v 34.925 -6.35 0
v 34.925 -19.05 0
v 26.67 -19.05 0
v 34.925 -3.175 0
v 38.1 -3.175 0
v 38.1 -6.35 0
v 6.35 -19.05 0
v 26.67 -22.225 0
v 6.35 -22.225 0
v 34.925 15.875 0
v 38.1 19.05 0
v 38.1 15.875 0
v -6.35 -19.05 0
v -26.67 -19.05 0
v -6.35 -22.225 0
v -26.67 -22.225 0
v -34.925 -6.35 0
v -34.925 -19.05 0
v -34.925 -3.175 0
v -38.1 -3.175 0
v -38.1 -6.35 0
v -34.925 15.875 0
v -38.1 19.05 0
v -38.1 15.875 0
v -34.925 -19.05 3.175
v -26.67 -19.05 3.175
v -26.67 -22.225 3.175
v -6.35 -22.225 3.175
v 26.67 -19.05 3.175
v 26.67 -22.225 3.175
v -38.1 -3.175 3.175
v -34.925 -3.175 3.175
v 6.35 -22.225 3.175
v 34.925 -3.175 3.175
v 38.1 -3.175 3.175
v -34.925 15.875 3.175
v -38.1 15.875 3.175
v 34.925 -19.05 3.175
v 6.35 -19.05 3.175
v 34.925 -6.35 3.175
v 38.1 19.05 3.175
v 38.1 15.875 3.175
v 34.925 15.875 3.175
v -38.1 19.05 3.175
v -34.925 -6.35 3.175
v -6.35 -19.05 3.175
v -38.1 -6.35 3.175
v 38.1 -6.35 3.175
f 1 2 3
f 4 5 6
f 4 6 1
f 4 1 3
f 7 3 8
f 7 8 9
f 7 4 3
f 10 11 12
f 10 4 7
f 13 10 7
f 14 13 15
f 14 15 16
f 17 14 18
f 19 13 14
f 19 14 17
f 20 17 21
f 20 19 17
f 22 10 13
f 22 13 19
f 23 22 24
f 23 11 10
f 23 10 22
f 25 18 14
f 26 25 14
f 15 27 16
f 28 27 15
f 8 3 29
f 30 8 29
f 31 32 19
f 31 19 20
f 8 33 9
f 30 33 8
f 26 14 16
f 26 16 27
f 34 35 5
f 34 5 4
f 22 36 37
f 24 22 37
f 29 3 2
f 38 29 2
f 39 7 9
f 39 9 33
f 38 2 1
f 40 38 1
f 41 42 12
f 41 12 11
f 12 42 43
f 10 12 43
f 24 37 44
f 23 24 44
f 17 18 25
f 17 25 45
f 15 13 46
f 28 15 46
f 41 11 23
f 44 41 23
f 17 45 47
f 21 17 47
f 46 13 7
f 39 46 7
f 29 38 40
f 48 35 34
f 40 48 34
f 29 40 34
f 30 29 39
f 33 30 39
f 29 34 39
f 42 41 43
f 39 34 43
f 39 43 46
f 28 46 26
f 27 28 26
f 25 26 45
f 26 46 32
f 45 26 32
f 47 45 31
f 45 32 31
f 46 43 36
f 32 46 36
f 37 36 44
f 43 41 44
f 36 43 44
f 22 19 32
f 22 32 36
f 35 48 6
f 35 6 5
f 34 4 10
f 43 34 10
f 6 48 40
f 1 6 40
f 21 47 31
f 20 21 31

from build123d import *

# Parameters (mm, degrees)
SKETCH1_W           = 69.85
SKETCH1_H           = 38.1
BOSS_EXTRUDE1_DEPTH = 3.175
SKETCH2_W           = 3.175
SKETCH2_H           = 3.175
BOSS_EXTRUDE2_DEPTH = 3.175
SKETCH3_W           = 20.32
SKETCH3_H           = 3.175
BOSS_EXTRUDE3_DEPTH = 3.175


with BuildPart() as part:
    # Sketch1 → Boss-Extrude1 (new body)
    with BuildSketch(Plane.XY):
        Rectangle(SKETCH1_W, SKETCH1_H)
    extrude(amount=BOSS_EXTRUDE1_DEPTH)

    # Sketch2 → Boss-Extrude2 (add)
    with BuildSketch(Plane(origin=(0, 0, 0), x_dir=(-1, 0, 0), z_dir=(0, 0, -1))):
        with Locations((-36.5125, 17.4625)):
            Rectangle(SKETCH2_W, SKETCH2_H)
        with Locations((-36.5125, -4.7625)):
            Rectangle(SKETCH2_W, SKETCH2_H)
        with Locations((36.5125, 17.4625)):
            Rectangle(SKETCH2_W, SKETCH2_H)
        with Locations((36.5125, -4.7625)):
            Rectangle(SKETCH2_W, SKETCH2_H)
    extrude(amount=-BOSS_EXTRUDE2_DEPTH)

    # Sketch3 → Boss-Extrude3 (add)
    with BuildSketch(Plane.XZ.offset(19.05)):
        with Locations((-16.51, 1.5875)):
            Rectangle(SKETCH3_W, SKETCH3_H)
        with Locations((16.51, 1.5875)):
            Rectangle(SKETCH3_W, SKETCH3_H)
    extrude(amount=BOSS_EXTRUDE3_DEPTH)


solid = part.part
